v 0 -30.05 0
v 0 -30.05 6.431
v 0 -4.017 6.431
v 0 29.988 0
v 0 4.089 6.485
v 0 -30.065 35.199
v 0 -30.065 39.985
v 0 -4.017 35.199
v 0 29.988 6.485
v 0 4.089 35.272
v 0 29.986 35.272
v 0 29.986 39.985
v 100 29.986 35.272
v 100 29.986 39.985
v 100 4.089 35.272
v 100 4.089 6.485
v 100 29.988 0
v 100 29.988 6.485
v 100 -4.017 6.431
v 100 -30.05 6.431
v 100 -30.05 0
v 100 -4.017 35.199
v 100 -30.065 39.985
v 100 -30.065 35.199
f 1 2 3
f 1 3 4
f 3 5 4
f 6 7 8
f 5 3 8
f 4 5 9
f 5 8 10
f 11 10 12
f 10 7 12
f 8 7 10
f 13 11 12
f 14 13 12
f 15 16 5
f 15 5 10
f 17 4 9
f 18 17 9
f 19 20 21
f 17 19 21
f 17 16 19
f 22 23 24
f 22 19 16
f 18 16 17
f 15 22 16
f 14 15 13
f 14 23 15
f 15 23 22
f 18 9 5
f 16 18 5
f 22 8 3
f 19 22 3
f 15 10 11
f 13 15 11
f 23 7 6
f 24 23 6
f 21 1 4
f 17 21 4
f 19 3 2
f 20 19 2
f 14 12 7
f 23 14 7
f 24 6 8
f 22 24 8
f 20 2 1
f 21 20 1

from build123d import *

# Parameters (mm, degrees)
PAD_DEPTH = 100


with BuildPart() as part:
    # Sketch → Pad (new body)
    with BuildSketch(Plane.YZ):
        Polygon((-30.04999, 0), (29.988436, 0), (29.988436, 6.484765), (4.088979, 6.484765), (4.088979, 35.272057), (29.985703, 35.272057), (29.985703, 39.984997), (-30.064808, 39.984997), (-30.064808, 35.199318), (-4.016708, 35.199318), (-4.016708, 6.430613), (-30.04999, 6.430613), align=None)
    extrude(amount=PAD_DEPTH)


solid = part.part
